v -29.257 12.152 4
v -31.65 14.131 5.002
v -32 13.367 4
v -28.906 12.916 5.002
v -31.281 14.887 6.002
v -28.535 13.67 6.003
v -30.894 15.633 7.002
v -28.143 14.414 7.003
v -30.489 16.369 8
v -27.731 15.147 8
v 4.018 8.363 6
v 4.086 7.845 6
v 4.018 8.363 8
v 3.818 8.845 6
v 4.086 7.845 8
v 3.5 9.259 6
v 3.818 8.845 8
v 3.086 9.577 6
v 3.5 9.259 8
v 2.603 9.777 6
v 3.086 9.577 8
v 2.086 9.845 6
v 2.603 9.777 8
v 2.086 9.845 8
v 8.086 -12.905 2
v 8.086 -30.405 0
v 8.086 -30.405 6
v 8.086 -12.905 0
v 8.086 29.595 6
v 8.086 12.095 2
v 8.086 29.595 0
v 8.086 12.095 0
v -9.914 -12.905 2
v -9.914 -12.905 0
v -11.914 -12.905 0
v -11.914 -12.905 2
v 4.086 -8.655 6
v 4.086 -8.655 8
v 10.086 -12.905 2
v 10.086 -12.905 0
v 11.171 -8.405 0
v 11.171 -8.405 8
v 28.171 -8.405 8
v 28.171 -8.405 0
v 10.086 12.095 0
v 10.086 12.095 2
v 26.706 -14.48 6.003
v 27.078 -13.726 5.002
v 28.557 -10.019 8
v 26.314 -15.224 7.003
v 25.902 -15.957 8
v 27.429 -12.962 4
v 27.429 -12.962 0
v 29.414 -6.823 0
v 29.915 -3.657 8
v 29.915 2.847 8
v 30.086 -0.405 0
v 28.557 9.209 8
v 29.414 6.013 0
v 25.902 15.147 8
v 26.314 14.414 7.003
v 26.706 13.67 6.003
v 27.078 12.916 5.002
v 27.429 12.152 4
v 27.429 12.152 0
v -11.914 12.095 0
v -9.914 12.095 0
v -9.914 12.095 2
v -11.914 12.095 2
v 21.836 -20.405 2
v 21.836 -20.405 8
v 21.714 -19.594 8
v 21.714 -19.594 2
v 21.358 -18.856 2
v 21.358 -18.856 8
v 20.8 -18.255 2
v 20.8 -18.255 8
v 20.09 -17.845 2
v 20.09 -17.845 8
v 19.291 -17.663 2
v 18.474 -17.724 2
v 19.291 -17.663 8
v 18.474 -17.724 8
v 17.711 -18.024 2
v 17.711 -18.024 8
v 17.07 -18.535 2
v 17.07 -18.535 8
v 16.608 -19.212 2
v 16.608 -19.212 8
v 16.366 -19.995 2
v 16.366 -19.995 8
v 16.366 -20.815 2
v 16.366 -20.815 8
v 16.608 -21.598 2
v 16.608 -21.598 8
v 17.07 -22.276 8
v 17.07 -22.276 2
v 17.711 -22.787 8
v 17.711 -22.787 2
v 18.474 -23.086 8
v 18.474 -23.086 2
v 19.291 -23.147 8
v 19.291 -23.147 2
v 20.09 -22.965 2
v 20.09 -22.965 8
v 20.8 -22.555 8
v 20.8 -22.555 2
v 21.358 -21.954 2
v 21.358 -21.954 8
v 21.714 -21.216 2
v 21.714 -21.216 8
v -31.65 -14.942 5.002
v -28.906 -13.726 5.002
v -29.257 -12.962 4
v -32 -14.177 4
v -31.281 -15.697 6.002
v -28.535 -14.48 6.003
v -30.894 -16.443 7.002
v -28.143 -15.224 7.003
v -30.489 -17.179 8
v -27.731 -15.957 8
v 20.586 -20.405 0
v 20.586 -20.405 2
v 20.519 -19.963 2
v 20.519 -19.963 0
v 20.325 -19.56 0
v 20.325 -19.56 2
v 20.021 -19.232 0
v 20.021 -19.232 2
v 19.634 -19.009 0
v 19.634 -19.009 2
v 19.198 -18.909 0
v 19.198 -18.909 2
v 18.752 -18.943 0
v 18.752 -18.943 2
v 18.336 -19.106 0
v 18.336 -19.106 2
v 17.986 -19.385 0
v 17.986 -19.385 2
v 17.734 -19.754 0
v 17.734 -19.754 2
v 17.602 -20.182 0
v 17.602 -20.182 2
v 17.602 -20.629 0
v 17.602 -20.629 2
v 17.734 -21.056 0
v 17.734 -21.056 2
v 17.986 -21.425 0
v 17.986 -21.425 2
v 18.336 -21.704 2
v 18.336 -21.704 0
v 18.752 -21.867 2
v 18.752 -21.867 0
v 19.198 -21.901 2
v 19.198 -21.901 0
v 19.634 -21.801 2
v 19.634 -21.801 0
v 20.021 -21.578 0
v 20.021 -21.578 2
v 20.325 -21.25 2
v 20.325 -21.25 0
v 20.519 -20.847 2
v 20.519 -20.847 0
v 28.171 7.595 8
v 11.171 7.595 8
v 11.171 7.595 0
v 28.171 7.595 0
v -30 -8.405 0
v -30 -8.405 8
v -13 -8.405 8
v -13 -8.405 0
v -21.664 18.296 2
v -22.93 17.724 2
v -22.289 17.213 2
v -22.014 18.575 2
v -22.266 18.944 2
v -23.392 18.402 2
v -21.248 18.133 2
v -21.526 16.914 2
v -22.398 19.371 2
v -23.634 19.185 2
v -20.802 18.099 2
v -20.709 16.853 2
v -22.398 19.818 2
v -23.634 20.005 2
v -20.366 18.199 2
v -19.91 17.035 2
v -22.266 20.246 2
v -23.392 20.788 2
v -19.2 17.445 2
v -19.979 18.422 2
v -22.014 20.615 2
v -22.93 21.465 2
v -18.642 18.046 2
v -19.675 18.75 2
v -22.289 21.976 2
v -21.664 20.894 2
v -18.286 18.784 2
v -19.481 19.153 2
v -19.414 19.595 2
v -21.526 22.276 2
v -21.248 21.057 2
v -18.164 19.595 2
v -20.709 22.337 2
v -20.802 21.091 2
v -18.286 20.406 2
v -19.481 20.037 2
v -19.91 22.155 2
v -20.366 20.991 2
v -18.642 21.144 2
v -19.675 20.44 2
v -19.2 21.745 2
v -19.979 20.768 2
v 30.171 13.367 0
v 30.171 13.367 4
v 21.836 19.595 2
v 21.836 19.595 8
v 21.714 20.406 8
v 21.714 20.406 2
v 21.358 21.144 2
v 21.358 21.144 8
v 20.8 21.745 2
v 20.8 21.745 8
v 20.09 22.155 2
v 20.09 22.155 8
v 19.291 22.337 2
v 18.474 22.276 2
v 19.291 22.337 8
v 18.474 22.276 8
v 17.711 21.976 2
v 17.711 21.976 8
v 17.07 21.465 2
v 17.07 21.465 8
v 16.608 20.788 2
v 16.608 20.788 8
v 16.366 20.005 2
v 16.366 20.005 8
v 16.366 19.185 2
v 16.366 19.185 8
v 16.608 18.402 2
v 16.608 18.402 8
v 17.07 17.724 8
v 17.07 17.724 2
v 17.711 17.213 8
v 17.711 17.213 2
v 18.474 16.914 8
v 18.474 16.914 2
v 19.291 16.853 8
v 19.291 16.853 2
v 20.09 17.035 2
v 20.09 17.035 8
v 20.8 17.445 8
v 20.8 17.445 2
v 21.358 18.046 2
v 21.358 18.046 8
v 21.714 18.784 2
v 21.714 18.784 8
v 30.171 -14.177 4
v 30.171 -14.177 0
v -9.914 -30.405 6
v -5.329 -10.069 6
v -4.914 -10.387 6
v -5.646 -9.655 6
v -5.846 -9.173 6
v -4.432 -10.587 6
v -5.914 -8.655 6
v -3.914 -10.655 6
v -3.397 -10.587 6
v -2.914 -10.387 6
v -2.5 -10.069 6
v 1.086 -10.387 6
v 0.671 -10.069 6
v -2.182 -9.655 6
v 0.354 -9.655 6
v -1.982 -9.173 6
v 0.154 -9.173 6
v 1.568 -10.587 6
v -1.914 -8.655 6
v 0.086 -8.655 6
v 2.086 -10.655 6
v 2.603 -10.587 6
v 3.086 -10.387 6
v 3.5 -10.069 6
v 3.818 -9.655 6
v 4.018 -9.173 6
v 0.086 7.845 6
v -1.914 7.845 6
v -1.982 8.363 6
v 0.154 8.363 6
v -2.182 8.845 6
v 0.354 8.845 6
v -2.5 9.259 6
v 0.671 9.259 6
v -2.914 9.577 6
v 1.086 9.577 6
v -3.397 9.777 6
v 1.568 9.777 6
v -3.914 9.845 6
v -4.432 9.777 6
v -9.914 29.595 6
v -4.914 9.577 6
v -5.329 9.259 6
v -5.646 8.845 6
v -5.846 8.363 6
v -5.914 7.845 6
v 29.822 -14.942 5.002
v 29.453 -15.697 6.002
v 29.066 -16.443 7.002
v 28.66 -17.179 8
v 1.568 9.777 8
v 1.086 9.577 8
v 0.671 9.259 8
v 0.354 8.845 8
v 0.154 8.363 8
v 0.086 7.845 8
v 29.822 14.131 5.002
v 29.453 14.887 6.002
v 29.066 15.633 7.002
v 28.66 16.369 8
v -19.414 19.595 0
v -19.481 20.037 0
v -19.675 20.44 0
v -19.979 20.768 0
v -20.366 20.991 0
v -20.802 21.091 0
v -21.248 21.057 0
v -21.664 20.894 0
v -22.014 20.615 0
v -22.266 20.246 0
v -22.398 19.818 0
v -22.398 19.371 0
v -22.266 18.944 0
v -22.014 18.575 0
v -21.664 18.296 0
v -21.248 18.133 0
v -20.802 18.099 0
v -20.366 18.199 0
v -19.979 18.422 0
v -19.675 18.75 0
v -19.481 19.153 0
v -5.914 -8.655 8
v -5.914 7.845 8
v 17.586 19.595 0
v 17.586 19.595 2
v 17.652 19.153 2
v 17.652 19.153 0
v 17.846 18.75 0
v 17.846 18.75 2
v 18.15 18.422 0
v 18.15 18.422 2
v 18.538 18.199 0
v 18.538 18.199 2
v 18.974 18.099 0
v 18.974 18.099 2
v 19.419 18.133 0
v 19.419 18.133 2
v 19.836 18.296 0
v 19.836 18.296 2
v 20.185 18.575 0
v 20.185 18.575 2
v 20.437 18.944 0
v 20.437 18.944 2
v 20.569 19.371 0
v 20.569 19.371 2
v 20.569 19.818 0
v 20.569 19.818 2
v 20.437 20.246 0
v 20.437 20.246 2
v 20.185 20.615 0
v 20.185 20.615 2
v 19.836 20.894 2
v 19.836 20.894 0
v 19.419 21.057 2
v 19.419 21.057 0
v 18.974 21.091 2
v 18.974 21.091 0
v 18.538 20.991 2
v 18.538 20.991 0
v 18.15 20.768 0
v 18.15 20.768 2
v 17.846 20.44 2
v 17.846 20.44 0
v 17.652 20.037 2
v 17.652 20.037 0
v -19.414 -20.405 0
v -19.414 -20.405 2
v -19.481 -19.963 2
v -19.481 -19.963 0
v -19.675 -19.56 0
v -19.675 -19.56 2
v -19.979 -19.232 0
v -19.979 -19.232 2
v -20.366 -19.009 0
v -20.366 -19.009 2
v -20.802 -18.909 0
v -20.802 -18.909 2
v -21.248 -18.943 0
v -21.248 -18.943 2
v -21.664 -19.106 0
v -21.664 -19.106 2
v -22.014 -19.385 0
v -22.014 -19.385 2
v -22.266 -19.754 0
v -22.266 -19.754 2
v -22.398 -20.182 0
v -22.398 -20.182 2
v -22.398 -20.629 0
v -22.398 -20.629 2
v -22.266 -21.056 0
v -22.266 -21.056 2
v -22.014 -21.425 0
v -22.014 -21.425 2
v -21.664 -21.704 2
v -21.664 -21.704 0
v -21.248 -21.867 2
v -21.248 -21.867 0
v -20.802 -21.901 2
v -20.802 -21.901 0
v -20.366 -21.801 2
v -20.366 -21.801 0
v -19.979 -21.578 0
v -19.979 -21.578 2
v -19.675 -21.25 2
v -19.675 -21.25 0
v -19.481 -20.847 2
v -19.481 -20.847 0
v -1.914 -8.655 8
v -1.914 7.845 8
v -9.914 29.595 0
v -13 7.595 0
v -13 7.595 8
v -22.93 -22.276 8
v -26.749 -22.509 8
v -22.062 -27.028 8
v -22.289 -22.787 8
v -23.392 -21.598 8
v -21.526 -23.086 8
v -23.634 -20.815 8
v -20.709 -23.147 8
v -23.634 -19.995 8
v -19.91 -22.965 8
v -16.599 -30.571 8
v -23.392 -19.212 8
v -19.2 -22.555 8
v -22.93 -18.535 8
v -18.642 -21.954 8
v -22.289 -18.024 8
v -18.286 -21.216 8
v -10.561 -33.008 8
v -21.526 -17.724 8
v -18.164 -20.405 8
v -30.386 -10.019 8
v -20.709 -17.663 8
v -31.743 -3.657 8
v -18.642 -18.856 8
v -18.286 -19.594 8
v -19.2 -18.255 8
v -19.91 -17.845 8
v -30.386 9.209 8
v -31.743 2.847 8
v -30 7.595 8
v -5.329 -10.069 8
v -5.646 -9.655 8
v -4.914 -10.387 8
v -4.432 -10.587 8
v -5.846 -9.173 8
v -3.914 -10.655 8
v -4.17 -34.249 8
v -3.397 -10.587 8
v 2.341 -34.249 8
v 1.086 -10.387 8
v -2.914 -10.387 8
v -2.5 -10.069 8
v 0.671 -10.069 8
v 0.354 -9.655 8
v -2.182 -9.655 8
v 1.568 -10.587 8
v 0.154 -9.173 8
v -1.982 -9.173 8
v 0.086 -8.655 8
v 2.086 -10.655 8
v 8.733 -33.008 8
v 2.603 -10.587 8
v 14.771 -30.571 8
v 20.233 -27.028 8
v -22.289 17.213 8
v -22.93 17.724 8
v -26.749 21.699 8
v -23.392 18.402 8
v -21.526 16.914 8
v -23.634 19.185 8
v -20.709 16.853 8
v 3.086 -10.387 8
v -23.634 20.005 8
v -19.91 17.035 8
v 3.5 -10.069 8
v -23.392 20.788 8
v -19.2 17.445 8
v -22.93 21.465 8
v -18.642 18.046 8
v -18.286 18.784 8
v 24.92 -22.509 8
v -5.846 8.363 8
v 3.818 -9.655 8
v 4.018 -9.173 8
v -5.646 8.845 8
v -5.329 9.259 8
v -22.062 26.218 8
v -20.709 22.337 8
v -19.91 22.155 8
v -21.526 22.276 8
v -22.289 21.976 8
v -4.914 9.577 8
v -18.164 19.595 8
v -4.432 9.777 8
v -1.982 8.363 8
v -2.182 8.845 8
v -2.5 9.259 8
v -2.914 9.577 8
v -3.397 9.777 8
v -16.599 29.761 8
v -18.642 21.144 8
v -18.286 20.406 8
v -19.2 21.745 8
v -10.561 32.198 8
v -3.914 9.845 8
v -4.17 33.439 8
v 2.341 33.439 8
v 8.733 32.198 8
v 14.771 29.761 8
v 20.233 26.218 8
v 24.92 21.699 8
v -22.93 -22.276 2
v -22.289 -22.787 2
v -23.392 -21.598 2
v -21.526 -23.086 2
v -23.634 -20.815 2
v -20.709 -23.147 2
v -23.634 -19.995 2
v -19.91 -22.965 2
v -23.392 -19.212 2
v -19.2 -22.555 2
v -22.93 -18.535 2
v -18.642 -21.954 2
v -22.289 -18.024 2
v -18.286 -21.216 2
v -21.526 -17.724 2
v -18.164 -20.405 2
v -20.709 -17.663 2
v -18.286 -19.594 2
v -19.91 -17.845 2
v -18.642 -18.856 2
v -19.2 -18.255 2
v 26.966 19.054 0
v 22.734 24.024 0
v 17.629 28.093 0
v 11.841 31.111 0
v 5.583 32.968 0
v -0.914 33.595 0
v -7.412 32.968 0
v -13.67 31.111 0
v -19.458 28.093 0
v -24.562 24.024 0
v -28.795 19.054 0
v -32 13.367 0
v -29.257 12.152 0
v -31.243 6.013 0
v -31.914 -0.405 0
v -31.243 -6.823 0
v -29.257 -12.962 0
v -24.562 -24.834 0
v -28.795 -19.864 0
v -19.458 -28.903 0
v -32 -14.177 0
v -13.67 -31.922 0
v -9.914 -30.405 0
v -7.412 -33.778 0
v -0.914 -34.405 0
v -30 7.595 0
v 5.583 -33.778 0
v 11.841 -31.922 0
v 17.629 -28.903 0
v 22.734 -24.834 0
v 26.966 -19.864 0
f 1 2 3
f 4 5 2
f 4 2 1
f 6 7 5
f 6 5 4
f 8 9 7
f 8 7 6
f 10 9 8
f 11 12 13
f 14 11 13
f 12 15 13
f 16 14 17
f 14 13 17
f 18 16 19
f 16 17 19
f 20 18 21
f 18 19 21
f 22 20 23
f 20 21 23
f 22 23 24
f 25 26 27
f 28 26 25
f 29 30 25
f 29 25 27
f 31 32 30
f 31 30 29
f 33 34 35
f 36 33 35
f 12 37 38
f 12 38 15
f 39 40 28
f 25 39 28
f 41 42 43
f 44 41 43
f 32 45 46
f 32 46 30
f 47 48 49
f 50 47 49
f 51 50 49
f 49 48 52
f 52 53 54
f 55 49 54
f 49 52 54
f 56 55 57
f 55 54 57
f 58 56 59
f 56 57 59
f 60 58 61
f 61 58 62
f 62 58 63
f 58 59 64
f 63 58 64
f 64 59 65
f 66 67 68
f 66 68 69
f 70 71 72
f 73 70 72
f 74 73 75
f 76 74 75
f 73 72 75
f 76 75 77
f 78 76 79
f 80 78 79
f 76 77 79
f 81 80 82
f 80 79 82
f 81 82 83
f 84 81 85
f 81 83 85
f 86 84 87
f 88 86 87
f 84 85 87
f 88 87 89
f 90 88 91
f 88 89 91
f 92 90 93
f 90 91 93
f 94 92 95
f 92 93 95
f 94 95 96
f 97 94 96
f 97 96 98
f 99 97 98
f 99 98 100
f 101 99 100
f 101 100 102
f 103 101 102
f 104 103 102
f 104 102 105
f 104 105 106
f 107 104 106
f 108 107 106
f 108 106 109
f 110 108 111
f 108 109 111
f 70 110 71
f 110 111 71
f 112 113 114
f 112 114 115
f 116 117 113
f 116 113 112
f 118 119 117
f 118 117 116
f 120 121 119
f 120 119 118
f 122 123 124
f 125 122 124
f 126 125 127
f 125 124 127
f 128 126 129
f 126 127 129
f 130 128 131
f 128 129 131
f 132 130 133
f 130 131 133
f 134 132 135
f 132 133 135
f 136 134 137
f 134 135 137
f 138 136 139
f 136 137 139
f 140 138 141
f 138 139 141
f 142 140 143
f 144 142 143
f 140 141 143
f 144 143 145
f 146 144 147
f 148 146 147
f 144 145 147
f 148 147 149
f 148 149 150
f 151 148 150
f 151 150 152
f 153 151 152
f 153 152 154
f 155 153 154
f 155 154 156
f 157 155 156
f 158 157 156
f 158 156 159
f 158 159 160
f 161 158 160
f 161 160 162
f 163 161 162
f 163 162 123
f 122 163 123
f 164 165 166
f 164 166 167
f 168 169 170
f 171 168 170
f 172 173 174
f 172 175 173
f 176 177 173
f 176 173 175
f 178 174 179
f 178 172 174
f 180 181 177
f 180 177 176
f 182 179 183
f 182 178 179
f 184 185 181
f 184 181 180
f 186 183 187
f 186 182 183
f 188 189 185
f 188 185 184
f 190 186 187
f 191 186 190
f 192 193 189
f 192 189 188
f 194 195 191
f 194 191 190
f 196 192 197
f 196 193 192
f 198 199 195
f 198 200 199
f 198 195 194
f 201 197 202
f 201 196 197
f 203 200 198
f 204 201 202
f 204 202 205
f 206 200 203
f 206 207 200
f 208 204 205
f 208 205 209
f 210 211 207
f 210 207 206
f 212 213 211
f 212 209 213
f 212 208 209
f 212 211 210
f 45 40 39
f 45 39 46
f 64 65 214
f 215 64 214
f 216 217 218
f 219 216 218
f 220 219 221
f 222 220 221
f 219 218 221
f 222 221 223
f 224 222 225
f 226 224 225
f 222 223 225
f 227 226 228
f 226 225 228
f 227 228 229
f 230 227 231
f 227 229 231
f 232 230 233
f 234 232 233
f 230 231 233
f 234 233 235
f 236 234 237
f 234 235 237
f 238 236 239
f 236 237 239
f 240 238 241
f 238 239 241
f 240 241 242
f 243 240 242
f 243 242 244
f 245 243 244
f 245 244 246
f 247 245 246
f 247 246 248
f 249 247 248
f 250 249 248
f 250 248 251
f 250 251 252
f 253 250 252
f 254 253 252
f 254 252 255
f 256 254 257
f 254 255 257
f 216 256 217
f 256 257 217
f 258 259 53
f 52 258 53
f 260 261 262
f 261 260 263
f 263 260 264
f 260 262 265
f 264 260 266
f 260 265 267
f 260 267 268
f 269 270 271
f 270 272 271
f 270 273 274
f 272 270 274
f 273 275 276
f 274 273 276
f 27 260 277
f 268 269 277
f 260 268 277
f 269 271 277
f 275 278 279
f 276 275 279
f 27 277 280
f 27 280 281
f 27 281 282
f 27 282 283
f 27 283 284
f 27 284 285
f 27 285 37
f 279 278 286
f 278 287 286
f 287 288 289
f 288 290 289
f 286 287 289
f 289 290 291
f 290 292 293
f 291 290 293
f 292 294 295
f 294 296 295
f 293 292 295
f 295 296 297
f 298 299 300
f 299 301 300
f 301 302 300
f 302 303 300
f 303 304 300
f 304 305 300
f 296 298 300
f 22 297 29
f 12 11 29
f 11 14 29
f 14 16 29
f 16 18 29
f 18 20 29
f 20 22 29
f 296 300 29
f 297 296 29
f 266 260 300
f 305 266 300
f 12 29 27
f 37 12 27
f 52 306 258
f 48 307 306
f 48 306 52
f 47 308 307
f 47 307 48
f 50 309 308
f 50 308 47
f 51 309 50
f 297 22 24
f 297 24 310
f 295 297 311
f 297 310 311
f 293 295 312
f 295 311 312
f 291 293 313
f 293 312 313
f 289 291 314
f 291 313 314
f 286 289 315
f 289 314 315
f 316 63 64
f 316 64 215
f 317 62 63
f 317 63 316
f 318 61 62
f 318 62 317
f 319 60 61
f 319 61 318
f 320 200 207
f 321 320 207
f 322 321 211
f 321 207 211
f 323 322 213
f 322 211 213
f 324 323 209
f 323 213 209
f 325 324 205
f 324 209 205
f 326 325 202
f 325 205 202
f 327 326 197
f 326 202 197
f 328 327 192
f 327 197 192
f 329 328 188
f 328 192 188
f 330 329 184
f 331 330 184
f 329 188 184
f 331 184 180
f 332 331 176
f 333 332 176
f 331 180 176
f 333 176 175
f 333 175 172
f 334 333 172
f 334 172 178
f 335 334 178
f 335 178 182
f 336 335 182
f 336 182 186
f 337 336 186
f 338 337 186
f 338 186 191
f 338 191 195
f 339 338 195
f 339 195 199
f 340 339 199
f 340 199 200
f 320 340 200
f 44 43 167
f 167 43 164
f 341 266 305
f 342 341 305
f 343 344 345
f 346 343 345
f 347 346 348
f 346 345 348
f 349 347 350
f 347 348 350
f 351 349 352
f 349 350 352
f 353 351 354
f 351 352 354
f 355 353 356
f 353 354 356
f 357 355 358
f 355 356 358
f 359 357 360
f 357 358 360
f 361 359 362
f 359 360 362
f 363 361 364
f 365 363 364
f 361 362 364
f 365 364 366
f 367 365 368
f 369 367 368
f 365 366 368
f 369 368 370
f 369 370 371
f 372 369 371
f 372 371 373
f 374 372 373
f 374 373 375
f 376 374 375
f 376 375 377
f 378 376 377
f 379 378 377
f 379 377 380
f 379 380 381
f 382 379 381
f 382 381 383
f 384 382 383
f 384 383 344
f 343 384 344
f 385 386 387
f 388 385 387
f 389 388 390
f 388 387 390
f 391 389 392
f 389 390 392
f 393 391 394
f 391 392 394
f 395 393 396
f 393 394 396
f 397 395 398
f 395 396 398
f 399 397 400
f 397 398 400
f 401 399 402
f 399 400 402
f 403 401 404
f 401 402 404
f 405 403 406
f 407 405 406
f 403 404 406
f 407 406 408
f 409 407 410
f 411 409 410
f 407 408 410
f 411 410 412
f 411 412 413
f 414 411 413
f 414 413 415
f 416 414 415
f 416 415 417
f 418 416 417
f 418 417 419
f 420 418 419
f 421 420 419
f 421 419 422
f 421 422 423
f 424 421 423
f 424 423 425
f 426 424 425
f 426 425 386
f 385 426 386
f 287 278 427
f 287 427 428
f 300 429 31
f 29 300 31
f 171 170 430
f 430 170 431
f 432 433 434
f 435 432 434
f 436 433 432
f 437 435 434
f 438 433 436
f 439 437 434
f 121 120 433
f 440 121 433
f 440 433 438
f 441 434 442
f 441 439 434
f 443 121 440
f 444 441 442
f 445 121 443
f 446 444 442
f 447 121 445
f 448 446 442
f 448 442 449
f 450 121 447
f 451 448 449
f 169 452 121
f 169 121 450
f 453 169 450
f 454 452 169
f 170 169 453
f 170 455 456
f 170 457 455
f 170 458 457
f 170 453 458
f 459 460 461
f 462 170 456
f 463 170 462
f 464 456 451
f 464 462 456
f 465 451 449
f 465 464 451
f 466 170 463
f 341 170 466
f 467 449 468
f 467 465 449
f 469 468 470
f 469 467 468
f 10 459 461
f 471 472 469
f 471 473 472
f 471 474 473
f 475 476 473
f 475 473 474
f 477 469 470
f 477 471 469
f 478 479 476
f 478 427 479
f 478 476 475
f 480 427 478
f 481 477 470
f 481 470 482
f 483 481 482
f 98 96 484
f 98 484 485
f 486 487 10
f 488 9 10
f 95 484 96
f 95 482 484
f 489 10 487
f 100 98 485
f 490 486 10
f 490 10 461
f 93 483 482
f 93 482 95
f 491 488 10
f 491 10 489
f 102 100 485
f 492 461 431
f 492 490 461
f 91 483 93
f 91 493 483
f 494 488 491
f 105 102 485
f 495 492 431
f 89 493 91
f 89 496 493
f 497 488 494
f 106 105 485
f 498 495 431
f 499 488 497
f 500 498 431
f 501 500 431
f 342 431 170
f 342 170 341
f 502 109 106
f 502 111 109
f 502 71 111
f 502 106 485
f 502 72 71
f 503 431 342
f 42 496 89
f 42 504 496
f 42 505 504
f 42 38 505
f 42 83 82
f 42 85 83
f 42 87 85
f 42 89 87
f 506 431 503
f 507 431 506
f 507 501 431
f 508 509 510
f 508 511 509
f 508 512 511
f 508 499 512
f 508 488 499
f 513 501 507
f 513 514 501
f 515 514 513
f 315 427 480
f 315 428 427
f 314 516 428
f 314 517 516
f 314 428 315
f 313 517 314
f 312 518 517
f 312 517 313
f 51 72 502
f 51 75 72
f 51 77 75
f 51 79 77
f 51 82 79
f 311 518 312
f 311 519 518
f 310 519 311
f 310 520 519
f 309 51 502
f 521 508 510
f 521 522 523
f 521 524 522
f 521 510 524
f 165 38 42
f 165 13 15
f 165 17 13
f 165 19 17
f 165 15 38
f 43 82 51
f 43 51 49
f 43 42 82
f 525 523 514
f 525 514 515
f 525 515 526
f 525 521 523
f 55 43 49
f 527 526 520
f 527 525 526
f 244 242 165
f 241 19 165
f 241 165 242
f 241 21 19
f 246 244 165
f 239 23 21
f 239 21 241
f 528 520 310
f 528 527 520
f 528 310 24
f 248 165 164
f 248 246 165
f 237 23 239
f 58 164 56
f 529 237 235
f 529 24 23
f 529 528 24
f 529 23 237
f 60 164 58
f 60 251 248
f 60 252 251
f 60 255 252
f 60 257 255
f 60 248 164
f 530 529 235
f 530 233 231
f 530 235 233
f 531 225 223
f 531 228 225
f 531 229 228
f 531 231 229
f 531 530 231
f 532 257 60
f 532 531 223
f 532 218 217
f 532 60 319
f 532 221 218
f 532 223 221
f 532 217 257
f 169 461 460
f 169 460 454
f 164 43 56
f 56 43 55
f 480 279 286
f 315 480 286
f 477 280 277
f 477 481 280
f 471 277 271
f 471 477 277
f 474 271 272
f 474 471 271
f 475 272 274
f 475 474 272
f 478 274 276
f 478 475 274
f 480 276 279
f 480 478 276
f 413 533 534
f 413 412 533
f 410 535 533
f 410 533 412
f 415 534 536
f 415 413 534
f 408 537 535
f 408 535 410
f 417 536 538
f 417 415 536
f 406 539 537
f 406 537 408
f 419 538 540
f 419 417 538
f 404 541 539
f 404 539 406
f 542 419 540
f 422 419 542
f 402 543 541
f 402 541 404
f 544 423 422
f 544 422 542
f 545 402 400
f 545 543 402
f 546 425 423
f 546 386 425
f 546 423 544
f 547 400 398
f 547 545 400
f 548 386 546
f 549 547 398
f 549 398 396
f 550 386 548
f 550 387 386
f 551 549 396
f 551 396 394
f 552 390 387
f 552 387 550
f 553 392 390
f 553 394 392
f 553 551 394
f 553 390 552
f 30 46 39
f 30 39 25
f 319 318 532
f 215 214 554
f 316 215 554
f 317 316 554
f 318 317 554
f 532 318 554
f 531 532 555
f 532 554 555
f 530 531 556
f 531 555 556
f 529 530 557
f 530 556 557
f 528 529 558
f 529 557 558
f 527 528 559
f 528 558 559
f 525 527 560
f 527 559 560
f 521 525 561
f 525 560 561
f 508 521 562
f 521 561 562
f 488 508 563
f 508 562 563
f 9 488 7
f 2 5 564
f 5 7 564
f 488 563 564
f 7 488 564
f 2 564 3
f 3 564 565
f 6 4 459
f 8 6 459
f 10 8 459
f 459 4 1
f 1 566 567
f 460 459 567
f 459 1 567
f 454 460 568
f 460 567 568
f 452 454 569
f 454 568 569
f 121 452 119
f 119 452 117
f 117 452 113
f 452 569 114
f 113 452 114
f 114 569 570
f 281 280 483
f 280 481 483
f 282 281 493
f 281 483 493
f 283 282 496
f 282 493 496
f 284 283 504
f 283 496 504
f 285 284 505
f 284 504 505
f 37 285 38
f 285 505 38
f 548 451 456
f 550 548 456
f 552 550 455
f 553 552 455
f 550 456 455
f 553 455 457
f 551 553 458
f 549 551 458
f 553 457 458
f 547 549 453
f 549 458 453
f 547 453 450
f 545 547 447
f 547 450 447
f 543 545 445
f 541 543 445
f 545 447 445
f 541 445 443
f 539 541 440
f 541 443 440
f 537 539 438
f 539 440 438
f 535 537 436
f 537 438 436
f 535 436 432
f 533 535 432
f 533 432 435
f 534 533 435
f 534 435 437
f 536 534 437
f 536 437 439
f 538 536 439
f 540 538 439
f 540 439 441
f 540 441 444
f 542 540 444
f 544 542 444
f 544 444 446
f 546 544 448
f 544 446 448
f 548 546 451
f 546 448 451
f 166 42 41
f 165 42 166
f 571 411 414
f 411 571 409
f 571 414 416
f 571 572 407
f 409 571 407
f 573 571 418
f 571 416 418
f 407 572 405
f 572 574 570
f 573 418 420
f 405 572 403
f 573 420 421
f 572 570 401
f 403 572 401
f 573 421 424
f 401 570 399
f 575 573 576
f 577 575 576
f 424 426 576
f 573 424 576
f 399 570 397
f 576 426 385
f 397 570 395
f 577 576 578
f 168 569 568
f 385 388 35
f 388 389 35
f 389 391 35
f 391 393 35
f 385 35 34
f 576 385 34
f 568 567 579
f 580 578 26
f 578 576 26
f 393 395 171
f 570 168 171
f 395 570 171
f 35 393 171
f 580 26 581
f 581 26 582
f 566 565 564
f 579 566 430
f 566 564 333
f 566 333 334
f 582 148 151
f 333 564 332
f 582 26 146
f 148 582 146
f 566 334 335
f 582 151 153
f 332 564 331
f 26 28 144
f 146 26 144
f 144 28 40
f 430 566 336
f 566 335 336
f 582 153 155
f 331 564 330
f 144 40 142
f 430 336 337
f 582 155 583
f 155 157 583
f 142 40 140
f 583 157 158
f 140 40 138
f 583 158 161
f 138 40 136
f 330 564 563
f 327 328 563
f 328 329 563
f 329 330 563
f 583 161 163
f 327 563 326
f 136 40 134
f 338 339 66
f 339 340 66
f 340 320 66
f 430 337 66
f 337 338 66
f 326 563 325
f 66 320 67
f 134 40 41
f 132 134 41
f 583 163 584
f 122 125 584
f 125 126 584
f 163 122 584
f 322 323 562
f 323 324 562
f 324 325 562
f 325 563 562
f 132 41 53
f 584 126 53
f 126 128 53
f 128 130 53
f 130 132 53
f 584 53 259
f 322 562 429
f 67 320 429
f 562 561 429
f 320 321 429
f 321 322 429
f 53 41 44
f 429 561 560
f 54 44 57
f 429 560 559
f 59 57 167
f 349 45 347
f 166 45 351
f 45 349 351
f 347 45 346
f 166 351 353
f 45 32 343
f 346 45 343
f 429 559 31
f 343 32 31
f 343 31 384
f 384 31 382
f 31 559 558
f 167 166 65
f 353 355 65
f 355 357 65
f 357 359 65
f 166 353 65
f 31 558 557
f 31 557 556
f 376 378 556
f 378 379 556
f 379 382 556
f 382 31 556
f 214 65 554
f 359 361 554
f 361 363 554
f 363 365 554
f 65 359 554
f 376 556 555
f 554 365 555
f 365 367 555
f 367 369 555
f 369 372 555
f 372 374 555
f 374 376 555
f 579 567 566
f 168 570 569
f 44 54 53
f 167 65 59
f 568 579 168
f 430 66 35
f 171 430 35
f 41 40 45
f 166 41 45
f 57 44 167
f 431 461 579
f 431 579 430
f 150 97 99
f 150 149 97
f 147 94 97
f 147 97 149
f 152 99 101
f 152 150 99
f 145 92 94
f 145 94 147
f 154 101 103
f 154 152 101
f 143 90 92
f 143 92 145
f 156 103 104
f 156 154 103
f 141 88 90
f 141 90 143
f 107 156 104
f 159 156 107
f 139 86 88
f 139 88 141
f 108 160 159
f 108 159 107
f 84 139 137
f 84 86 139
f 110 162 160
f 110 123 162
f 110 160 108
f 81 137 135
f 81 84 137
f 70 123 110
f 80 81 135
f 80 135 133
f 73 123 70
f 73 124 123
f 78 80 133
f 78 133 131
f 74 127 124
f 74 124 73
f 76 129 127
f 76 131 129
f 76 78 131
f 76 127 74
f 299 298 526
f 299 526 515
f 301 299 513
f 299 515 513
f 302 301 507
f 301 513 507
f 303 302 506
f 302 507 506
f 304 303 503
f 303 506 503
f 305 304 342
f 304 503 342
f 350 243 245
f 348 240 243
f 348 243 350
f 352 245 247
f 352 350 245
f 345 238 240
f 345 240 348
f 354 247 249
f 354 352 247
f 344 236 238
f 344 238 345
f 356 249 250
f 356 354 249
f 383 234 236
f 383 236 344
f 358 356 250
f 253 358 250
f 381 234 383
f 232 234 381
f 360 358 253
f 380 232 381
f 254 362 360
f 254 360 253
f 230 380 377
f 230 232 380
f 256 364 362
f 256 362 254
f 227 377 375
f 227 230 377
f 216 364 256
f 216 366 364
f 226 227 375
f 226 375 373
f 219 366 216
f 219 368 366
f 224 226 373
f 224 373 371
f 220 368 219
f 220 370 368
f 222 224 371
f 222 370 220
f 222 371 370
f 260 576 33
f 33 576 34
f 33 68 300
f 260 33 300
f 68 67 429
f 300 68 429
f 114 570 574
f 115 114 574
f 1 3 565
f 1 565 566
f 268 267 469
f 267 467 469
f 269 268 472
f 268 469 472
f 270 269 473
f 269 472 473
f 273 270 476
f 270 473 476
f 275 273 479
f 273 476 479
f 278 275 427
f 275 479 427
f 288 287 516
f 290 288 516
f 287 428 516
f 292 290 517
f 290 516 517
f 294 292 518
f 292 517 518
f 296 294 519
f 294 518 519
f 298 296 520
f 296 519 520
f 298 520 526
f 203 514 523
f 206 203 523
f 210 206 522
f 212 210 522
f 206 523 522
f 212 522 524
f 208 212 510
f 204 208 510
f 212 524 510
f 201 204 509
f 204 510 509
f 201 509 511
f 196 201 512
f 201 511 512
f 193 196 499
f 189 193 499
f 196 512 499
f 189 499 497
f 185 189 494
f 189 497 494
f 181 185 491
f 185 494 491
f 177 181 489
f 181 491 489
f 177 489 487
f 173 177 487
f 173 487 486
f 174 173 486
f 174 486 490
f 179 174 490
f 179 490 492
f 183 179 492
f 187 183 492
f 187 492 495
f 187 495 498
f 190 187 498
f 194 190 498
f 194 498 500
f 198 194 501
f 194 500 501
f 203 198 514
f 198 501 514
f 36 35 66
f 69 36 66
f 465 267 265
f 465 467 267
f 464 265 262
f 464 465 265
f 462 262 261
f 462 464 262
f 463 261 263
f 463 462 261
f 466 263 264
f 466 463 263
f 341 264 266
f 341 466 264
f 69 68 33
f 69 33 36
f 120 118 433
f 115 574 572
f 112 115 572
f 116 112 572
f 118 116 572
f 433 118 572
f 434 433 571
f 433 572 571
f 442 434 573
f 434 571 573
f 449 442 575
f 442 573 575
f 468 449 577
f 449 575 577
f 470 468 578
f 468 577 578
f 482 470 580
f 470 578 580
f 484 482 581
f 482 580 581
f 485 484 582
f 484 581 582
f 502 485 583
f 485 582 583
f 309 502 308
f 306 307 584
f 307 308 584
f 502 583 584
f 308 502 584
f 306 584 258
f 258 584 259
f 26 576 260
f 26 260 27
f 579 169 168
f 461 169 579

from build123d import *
from OCP.BRepFilletAPI import BRepFilletAPI_MakeChamfer

# Parameters (mm, degrees)
BOSS_EXTRUDE1_DEPTH = 8
SKETCH3_W           = 17
SKETCH3_H           = 16
CUT_EXTRUDE1_DEPTH  = 8
SKETCH3_5_R         = 1.5
CUT_EXTRUDE3_DEPTH  = 8
SKETCH3_6_R         = 2.75
CUT_EXTRUDE4_DEPTH  = 6
CHAMFER1_SIZE       = 4
CHAMFER1_SIZE2      = 3.356398525
SKETCH4_W           = 18
SKETCH4_H           = 60
CUT_EXTRUDE6_DEPTH  = 6
SKETCH5_W           = 4
SKETCH5_H           = 20.5
CUT_EXTRUDE8_DEPTH  = 8
FILLET1_R           = 2
SKETCH6_W           = 22
SKETCH6_H           = 25
CUT_EXTRUDE10_DEPTH = 2


with BuildPart() as part:
    # Sketch1 → Boss-Extrude1 (new body)
    with BuildSketch(Plane.XY):
        with BuildLine():
            Line((-32, 13.367307057), (-29.257142857, 12.152097325))
            ThreePointArc((-29.257142857, 12.152097325), (-31.914285714, -0.405069911), (-29.257142857, -12.962237146))
            Line((-29.257142857, -12.962237146), (-32, -14.177446879))
            ThreePointArc((-32, -14.177446879), (-0.914285714, -34.405069911), (30.171428571, -14.177446879))
            Line((30.171428571, -14.177446879), (27.428571429, -12.962237146))
            ThreePointArc((27.428571429, -12.962237146), (30.085714286, -0.405069911), (27.428571429, 12.152097325))
            Line((27.428571429, 12.152097325), (30.171428571, 13.367307057))
            ThreePointArc((30.171428571, 13.367307057), (-0.914285714, 33.594930089), (-32, 13.367307057))
        make_face()
    extrude(amount=BOSS_EXTRUDE1_DEPTH)

    # Sketch3 → Cut-Extrude1 (cut)
    with BuildSketch(Plane.XY.offset(8)):
        with Locations((-21.5, -0.405069911)):
            Rectangle(SKETCH3_W, SKETCH3_H)
        with Locations((19.671428571, -0.405069911)):
            Rectangle(SKETCH3_W, SKETCH3_H)
    extrude(amount=-CUT_EXTRUDE1_DEPTH, mode=Mode.SUBTRACT)

    # Sketch3<5> → Cut-Extrude3 (cut)
    with BuildSketch(Plane.XY.offset(8)):
        with Locations(Location((19.085714286, 19.594930089, 0), (0, 0, 180))):
            Circle(SKETCH3_5_R)
        with Locations((-20.914285714, 19.594930089)):
            Circle(SKETCH3_5_R)
        with Locations((19.085714286, -20.405069911)):
            Circle(SKETCH3_5_R)
        with Locations((-20.914285714, -20.405069911)):
            Circle(SKETCH3_5_R)
    extrude(amount=-CUT_EXTRUDE3_DEPTH, mode=Mode.SUBTRACT)

    # Sketch3<6> → Cut-Extrude4 (cut)
    with BuildSketch(Plane.XY.offset(8)):
        with Locations((19.085714286, 19.594930089)):
            Circle(SKETCH3_6_R)
        with Locations((19.085714286, -20.405069911)):
            Circle(SKETCH3_6_R)
        with Locations((-20.914285714, 19.594930089)):
            Circle(SKETCH3_6_R)
        with Locations((-20.914285714, -20.405069911)):
            Circle(SKETCH3_6_R)
    extrude(amount=-CUT_EXTRUDE4_DEPTH, mode=Mode.SUBTRACT)

    # Chamfer1: one chamfer whose edges measure the first distance from different faces: ONE call of the kernel's chamfer builder (chamfer() names one face for all edges)
    chamfer1_edges_1 = [part.edges().sort_by_distance(p)[0] for p in [
        (28.8, 12.759702191, 8),
    ]]
    chamfer1_side_1 = [part.faces().sort_by_distance(p)[0] for p in [
        (28.8, 12.759702191, 4),
    ]]
    chamfer1_edges_2 = [part.edges().sort_by_distance(p)[0] for p in [
        (-30.628571429, 12.759702191, 8),
    ]]
    chamfer1_side_2 = [part.faces().sort_by_distance(p)[0] for p in [
        (-30.628571429, 12.759702191, 4),
    ]]
    chamfer1_edges_3 = [part.edges().sort_by_distance(p)[0] for p in [
        (-30.628571429, -13.569842013, 8),
    ]]
    chamfer1_side_3 = [part.faces().sort_by_distance(p)[0] for p in [
        (-30.628571429, -13.569842013, 4),
    ]]
    chamfer1_edges_4 = [part.edges().sort_by_distance(p)[0] for p in [
        (28.8, -13.569842013, 8),
    ]]
    chamfer1_side_4 = [part.faces().sort_by_distance(p)[0] for p in [
        (28.8, -13.569842013, 4),
    ]]
    chamfer1 = BRepFilletAPI_MakeChamfer(part.part.solid().wrapped)
    for e in chamfer1_edges_1:
        chamfer1.Add(CHAMFER1_SIZE, CHAMFER1_SIZE2, e.wrapped, chamfer1_side_1[0].wrapped)  # the first distance lies on this face
    for e in chamfer1_edges_2:
        chamfer1.Add(CHAMFER1_SIZE, CHAMFER1_SIZE2, e.wrapped, chamfer1_side_2[0].wrapped)  # the first distance lies on this face
    for e in chamfer1_edges_3:
        chamfer1.Add(CHAMFER1_SIZE, CHAMFER1_SIZE2, e.wrapped, chamfer1_side_3[0].wrapped)  # the first distance lies on this face
    for e in chamfer1_edges_4:
        chamfer1.Add(CHAMFER1_SIZE, CHAMFER1_SIZE2, e.wrapped, chamfer1_side_4[0].wrapped)  # the first distance lies on this face
    add(Compound.cast(chamfer1.Shape()), mode=Mode.REPLACE)

    # Sketch4 → Cut-Extrude6 (cut)
    with BuildSketch(Plane.XY):
        with Locations((-0.914285714, -0.405069911)):
            Rectangle(SKETCH4_W, SKETCH4_H)
    extrude(amount=CUT_EXTRUDE6_DEPTH, mode=Mode.SUBTRACT)

    # Sketch5 → Cut-Extrude8 (cut)
    with BuildSketch(Plane.XY):
        with Locations((2.085714286, -0.405069911)):
            Rectangle(SKETCH5_W, SKETCH5_H)
        with Locations((-3.914285714, -0.405069911)):
            Rectangle(SKETCH5_W, SKETCH5_H)
    extrude(amount=CUT_EXTRUDE8_DEPTH, mode=Mode.SUBTRACT)

    # Fillet1
    fillet1_edges = [part.edges().sort_by_distance(p)[0] for p in [
        (0.085714286, -10.655069911, 7),
        (4.085714286, -10.655069911, 7),
        (4.085714286, 9.844930089, 7),
        (0.085714286, 9.844930089, 7),
        (-1.914285714, -10.655069911, 7),
        (-5.914285714, -10.655069911, 7),
        (-1.914285714, 9.844930089, 7),
        (-5.914285714, 9.844930089, 7),
    ]]
    fillet(fillet1_edges, radius=FILLET1_R - 0.0001)  # a hair under: the kernel refuses the full size

    # Sketch6 → Cut-Extrude10 (cut)
    with BuildSketch(Plane(origin=(0, 0, 0), x_dir=(-1, 0, 0), z_dir=(0, 0, -1))):
        with Locations((0.914285714, -0.405069911)):
            Rectangle(SKETCH6_W, SKETCH6_H)
    extrude(amount=-CUT_EXTRUDE10_DEPTH, mode=Mode.SUBTRACT)


solid = part.part
